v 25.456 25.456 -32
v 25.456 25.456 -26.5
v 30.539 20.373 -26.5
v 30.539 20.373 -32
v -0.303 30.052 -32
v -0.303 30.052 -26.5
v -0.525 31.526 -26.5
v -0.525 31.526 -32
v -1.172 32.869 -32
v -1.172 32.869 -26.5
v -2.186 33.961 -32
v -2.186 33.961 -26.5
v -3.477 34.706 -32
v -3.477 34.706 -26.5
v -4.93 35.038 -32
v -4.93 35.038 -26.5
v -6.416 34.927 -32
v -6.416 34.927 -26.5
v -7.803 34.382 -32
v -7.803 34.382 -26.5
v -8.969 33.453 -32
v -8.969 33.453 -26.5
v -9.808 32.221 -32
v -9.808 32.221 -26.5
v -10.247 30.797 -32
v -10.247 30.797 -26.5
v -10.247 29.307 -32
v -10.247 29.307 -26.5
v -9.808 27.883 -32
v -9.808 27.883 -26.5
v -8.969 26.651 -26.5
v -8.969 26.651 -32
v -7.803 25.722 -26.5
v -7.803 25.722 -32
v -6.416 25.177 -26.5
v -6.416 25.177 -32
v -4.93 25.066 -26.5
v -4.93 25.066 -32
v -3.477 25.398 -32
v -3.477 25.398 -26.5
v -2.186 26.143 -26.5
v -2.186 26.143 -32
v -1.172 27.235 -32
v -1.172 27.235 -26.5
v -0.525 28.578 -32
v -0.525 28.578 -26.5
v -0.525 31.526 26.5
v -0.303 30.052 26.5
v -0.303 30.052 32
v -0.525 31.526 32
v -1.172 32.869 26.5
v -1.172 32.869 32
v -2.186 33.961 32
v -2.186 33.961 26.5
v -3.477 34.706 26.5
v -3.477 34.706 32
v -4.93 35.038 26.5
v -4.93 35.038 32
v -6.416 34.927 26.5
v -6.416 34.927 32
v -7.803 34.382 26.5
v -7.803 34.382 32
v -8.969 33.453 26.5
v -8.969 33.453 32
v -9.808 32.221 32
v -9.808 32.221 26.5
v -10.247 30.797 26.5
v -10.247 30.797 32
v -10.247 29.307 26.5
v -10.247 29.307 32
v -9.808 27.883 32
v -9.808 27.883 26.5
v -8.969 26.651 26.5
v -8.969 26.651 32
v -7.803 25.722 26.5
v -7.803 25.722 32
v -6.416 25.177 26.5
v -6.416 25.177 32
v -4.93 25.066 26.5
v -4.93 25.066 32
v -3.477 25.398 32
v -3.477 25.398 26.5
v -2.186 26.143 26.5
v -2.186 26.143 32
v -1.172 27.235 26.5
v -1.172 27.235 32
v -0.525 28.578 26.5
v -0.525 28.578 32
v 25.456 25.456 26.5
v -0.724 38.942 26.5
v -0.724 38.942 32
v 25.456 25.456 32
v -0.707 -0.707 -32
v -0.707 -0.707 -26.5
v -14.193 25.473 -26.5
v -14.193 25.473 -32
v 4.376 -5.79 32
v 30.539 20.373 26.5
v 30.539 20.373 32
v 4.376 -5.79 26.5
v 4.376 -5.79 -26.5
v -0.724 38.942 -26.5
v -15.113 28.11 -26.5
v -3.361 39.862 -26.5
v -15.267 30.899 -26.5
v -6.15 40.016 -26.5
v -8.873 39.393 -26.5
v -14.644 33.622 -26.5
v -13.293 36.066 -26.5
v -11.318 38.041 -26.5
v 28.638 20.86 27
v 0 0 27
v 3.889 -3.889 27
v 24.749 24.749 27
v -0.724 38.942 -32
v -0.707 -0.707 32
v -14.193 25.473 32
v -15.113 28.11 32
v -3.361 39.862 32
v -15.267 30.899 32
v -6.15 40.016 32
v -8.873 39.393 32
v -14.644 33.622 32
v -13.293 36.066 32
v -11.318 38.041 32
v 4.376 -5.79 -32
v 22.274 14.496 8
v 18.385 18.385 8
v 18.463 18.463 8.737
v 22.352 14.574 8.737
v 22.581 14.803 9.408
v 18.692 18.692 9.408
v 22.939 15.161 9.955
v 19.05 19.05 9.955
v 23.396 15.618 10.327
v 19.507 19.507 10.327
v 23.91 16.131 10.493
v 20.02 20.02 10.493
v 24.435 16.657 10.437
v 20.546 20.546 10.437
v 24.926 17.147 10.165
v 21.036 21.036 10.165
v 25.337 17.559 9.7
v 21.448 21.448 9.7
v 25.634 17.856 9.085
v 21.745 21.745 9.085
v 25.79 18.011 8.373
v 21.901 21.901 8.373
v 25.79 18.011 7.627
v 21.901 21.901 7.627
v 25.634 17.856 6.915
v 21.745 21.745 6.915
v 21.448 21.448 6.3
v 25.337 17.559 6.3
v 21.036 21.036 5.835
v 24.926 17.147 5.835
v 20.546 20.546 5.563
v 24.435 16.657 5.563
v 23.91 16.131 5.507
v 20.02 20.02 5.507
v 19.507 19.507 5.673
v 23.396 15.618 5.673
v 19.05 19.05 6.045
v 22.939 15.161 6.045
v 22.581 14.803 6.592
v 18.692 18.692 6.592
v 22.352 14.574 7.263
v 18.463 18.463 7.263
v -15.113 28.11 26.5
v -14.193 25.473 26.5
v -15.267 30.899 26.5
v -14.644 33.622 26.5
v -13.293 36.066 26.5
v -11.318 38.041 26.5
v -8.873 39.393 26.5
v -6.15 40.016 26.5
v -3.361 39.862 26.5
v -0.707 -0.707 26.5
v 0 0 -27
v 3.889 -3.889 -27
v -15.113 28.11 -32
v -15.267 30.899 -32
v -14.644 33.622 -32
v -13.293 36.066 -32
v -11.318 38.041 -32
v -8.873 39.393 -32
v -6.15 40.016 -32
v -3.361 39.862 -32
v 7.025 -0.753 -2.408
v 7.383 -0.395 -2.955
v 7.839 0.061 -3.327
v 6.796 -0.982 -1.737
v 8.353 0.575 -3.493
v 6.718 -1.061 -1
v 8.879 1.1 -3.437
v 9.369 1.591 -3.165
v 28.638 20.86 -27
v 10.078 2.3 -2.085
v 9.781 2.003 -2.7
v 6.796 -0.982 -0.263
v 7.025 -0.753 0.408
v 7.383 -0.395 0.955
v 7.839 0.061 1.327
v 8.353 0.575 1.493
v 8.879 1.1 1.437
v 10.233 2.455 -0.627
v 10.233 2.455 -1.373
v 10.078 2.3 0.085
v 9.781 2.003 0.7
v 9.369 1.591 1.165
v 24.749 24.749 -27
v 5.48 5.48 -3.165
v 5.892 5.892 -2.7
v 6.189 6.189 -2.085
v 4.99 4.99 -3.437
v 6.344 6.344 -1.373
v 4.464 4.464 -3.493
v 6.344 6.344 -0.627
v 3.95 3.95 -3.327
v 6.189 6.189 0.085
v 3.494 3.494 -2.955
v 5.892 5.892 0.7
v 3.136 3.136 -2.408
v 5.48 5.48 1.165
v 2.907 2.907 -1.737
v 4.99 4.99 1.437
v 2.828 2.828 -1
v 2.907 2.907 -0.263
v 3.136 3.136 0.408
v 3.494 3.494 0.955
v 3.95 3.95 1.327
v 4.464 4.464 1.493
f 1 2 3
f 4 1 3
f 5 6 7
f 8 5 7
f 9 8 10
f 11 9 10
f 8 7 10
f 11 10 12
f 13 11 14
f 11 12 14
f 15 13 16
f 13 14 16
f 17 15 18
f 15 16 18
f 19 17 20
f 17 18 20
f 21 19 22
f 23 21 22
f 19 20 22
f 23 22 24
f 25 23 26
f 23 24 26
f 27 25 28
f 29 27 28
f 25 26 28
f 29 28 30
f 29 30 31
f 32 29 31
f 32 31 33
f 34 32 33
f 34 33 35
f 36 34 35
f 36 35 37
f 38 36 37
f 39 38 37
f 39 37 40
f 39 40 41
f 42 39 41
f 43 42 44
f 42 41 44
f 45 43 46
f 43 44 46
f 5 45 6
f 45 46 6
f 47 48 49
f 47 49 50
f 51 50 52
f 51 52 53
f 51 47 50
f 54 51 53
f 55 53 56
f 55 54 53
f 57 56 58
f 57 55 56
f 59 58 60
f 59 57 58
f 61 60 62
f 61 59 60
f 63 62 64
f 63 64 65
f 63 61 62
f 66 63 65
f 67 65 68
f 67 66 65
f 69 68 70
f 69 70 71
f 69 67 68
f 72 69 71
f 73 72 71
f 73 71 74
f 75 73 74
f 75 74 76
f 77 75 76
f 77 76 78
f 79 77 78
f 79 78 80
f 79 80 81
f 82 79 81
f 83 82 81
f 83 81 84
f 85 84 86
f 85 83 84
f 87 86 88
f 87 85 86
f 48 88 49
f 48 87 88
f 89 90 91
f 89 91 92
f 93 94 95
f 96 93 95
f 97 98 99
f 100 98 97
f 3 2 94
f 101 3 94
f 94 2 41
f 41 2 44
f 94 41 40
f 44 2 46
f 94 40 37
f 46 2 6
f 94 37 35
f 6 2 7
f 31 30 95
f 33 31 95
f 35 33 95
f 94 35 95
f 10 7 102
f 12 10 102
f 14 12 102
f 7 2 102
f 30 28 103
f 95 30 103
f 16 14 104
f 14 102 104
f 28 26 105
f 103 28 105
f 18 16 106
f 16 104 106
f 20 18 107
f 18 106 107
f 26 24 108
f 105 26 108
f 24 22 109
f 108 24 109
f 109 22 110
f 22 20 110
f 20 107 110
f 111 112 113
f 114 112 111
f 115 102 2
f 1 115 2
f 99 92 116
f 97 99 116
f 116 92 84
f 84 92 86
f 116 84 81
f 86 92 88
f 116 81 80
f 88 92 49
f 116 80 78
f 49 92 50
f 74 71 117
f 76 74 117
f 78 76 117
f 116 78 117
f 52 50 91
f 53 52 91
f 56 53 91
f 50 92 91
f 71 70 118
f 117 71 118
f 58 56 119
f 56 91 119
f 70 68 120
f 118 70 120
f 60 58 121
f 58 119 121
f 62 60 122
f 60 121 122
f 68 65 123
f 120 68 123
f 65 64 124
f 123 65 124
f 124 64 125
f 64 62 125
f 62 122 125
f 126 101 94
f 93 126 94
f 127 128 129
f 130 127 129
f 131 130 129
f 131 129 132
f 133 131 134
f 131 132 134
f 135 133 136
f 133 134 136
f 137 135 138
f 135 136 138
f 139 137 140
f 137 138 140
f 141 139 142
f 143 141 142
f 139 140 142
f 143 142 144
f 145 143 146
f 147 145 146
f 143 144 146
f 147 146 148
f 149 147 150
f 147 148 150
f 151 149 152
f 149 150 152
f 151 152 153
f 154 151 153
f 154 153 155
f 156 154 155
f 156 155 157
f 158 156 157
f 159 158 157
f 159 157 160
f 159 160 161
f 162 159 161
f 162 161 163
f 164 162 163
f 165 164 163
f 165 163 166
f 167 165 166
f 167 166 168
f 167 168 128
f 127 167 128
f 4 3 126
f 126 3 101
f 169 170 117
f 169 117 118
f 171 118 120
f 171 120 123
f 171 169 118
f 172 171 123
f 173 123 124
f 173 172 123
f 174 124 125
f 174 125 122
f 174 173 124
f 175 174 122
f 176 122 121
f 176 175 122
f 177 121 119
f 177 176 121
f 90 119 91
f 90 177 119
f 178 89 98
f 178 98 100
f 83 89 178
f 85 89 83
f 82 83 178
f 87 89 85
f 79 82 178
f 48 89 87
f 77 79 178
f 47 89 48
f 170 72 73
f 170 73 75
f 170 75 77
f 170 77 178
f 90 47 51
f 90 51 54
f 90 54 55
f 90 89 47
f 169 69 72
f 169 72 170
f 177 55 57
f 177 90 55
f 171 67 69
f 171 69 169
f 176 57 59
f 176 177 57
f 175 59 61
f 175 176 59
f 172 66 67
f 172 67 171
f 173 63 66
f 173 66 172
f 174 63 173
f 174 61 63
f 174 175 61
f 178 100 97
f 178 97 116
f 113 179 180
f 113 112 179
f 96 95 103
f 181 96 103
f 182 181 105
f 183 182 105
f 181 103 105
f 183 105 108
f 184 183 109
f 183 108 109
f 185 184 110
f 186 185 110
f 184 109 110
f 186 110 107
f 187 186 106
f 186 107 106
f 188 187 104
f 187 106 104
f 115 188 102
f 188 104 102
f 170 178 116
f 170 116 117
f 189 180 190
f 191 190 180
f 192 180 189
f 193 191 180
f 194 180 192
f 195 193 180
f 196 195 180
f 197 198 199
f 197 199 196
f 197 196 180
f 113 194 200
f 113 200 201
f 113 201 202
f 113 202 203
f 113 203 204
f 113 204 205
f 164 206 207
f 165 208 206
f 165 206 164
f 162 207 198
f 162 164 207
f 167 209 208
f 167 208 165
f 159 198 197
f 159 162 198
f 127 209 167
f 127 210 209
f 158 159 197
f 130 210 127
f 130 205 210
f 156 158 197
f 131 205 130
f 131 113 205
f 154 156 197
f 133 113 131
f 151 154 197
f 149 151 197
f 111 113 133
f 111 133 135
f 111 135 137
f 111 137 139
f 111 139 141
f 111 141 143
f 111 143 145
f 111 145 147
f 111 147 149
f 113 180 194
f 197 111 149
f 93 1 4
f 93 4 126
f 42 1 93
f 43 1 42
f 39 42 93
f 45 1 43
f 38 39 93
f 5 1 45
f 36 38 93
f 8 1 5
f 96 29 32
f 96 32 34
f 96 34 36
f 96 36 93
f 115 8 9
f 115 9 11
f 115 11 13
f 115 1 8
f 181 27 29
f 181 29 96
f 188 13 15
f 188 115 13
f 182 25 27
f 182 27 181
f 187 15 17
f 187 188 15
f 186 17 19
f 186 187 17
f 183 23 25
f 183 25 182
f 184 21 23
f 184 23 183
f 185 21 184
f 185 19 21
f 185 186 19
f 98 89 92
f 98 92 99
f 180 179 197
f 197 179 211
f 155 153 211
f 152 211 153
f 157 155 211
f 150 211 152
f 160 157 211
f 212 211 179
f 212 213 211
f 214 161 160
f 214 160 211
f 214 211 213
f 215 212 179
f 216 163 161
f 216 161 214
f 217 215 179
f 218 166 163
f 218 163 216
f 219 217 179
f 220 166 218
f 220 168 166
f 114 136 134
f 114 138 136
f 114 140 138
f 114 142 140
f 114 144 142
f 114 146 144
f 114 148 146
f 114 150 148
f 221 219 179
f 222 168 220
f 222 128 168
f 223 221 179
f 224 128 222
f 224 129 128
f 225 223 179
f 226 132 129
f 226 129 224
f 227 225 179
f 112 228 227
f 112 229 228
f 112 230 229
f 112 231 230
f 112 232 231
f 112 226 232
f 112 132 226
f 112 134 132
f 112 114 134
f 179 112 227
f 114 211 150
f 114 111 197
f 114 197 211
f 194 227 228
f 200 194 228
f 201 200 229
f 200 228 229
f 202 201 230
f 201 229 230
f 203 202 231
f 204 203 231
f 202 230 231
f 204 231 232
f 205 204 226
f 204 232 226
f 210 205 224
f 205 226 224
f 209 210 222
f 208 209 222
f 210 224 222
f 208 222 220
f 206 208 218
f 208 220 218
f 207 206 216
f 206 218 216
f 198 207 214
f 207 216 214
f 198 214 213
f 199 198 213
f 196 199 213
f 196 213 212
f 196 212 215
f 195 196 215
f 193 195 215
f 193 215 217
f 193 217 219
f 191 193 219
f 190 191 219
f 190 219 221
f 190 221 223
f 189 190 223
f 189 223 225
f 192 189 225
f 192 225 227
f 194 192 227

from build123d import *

# Parameters (mm, degrees)
EXTRUDE_1_DEPTH     = 27
EXTRUDE_START       = -0.5
SKETCH_3_R          = 5
EXTRUDE_2_DEPTH     = 5.5
SKETCH_4_R          = 2.5
CUT_EXTRUDE_1_DEPTH = 10


with BuildPart() as part:
    # ｽｹｯﾁ1 → ﾎﾞｽ - 押し出し1 (new, symmetric)
    with BuildSketch(Plane.XY):
        Polygon((0, 0), (3.889087297, -3.889087297), (28.637824638, 20.859650045), (24.748737342, 24.748737342), align=None)
    extrude(amount=EXTRUDE_1_DEPTH, both=True)

    # ｽｹｯﾁ4 → ｶｯﾄ - 押し出し1 (cut)
    with BuildSketch(Plane(origin=(0, 0, 0), x_dir=(0, 0, 1), z_dir=(-0.7071067811865486, 0.7071067811865465, 0))):
        with Locations(Location((8, 28.5, 0), (0, 0, 270))):
            Circle(SKETCH_4_R)
        with Locations(Location((-1, 6.5, 0), (0, 0, 270))):
            Circle(SKETCH_4_R)
    extrude(amount=-CUT_EXTRUDE_1_DEPTH, mode=Mode.SUBTRACT)


with BuildPart() as body_2:
    # ｽｹｯﾁ3 → ﾎﾞｽ - 押し出し2 (new body)
    with BuildSketch(Plane.XY.offset(27).offset(EXTRUDE_START)):
        with BuildLine():
            Line((-0.707106781, -0.707106781), (-14.193116952, 25.472609216))
            ThreePointArc((-14.193116952, 25.472609216), (-12.374368671, 37.123106012), (-0.723871874, 38.941854294))
            Line((-0.723871874, 38.941854294), (25.455844123, 25.455844123))
            Line((25.455844123, 25.455844123), (30.538984259, 20.372703986))
            Line((30.538984259, 20.372703986), (4.376033356, -5.790246918))
            Line((4.376033356, -5.790246918), (-0.707106781, -0.707106781))
        make_face()
        with Locations((-5.303300859, 30.0520382)):
            Circle(SKETCH_3_R, mode=Mode.SUBTRACT)
    extrude(amount=EXTRUDE_2_DEPTH)


with BuildPart() as body_3:
    # ﾐﾗｰ1: mirrored copy
    add(body_2.part.mirror(Plane.XY))


solid = Compound([part.part, body_2.part, body_3.part])
